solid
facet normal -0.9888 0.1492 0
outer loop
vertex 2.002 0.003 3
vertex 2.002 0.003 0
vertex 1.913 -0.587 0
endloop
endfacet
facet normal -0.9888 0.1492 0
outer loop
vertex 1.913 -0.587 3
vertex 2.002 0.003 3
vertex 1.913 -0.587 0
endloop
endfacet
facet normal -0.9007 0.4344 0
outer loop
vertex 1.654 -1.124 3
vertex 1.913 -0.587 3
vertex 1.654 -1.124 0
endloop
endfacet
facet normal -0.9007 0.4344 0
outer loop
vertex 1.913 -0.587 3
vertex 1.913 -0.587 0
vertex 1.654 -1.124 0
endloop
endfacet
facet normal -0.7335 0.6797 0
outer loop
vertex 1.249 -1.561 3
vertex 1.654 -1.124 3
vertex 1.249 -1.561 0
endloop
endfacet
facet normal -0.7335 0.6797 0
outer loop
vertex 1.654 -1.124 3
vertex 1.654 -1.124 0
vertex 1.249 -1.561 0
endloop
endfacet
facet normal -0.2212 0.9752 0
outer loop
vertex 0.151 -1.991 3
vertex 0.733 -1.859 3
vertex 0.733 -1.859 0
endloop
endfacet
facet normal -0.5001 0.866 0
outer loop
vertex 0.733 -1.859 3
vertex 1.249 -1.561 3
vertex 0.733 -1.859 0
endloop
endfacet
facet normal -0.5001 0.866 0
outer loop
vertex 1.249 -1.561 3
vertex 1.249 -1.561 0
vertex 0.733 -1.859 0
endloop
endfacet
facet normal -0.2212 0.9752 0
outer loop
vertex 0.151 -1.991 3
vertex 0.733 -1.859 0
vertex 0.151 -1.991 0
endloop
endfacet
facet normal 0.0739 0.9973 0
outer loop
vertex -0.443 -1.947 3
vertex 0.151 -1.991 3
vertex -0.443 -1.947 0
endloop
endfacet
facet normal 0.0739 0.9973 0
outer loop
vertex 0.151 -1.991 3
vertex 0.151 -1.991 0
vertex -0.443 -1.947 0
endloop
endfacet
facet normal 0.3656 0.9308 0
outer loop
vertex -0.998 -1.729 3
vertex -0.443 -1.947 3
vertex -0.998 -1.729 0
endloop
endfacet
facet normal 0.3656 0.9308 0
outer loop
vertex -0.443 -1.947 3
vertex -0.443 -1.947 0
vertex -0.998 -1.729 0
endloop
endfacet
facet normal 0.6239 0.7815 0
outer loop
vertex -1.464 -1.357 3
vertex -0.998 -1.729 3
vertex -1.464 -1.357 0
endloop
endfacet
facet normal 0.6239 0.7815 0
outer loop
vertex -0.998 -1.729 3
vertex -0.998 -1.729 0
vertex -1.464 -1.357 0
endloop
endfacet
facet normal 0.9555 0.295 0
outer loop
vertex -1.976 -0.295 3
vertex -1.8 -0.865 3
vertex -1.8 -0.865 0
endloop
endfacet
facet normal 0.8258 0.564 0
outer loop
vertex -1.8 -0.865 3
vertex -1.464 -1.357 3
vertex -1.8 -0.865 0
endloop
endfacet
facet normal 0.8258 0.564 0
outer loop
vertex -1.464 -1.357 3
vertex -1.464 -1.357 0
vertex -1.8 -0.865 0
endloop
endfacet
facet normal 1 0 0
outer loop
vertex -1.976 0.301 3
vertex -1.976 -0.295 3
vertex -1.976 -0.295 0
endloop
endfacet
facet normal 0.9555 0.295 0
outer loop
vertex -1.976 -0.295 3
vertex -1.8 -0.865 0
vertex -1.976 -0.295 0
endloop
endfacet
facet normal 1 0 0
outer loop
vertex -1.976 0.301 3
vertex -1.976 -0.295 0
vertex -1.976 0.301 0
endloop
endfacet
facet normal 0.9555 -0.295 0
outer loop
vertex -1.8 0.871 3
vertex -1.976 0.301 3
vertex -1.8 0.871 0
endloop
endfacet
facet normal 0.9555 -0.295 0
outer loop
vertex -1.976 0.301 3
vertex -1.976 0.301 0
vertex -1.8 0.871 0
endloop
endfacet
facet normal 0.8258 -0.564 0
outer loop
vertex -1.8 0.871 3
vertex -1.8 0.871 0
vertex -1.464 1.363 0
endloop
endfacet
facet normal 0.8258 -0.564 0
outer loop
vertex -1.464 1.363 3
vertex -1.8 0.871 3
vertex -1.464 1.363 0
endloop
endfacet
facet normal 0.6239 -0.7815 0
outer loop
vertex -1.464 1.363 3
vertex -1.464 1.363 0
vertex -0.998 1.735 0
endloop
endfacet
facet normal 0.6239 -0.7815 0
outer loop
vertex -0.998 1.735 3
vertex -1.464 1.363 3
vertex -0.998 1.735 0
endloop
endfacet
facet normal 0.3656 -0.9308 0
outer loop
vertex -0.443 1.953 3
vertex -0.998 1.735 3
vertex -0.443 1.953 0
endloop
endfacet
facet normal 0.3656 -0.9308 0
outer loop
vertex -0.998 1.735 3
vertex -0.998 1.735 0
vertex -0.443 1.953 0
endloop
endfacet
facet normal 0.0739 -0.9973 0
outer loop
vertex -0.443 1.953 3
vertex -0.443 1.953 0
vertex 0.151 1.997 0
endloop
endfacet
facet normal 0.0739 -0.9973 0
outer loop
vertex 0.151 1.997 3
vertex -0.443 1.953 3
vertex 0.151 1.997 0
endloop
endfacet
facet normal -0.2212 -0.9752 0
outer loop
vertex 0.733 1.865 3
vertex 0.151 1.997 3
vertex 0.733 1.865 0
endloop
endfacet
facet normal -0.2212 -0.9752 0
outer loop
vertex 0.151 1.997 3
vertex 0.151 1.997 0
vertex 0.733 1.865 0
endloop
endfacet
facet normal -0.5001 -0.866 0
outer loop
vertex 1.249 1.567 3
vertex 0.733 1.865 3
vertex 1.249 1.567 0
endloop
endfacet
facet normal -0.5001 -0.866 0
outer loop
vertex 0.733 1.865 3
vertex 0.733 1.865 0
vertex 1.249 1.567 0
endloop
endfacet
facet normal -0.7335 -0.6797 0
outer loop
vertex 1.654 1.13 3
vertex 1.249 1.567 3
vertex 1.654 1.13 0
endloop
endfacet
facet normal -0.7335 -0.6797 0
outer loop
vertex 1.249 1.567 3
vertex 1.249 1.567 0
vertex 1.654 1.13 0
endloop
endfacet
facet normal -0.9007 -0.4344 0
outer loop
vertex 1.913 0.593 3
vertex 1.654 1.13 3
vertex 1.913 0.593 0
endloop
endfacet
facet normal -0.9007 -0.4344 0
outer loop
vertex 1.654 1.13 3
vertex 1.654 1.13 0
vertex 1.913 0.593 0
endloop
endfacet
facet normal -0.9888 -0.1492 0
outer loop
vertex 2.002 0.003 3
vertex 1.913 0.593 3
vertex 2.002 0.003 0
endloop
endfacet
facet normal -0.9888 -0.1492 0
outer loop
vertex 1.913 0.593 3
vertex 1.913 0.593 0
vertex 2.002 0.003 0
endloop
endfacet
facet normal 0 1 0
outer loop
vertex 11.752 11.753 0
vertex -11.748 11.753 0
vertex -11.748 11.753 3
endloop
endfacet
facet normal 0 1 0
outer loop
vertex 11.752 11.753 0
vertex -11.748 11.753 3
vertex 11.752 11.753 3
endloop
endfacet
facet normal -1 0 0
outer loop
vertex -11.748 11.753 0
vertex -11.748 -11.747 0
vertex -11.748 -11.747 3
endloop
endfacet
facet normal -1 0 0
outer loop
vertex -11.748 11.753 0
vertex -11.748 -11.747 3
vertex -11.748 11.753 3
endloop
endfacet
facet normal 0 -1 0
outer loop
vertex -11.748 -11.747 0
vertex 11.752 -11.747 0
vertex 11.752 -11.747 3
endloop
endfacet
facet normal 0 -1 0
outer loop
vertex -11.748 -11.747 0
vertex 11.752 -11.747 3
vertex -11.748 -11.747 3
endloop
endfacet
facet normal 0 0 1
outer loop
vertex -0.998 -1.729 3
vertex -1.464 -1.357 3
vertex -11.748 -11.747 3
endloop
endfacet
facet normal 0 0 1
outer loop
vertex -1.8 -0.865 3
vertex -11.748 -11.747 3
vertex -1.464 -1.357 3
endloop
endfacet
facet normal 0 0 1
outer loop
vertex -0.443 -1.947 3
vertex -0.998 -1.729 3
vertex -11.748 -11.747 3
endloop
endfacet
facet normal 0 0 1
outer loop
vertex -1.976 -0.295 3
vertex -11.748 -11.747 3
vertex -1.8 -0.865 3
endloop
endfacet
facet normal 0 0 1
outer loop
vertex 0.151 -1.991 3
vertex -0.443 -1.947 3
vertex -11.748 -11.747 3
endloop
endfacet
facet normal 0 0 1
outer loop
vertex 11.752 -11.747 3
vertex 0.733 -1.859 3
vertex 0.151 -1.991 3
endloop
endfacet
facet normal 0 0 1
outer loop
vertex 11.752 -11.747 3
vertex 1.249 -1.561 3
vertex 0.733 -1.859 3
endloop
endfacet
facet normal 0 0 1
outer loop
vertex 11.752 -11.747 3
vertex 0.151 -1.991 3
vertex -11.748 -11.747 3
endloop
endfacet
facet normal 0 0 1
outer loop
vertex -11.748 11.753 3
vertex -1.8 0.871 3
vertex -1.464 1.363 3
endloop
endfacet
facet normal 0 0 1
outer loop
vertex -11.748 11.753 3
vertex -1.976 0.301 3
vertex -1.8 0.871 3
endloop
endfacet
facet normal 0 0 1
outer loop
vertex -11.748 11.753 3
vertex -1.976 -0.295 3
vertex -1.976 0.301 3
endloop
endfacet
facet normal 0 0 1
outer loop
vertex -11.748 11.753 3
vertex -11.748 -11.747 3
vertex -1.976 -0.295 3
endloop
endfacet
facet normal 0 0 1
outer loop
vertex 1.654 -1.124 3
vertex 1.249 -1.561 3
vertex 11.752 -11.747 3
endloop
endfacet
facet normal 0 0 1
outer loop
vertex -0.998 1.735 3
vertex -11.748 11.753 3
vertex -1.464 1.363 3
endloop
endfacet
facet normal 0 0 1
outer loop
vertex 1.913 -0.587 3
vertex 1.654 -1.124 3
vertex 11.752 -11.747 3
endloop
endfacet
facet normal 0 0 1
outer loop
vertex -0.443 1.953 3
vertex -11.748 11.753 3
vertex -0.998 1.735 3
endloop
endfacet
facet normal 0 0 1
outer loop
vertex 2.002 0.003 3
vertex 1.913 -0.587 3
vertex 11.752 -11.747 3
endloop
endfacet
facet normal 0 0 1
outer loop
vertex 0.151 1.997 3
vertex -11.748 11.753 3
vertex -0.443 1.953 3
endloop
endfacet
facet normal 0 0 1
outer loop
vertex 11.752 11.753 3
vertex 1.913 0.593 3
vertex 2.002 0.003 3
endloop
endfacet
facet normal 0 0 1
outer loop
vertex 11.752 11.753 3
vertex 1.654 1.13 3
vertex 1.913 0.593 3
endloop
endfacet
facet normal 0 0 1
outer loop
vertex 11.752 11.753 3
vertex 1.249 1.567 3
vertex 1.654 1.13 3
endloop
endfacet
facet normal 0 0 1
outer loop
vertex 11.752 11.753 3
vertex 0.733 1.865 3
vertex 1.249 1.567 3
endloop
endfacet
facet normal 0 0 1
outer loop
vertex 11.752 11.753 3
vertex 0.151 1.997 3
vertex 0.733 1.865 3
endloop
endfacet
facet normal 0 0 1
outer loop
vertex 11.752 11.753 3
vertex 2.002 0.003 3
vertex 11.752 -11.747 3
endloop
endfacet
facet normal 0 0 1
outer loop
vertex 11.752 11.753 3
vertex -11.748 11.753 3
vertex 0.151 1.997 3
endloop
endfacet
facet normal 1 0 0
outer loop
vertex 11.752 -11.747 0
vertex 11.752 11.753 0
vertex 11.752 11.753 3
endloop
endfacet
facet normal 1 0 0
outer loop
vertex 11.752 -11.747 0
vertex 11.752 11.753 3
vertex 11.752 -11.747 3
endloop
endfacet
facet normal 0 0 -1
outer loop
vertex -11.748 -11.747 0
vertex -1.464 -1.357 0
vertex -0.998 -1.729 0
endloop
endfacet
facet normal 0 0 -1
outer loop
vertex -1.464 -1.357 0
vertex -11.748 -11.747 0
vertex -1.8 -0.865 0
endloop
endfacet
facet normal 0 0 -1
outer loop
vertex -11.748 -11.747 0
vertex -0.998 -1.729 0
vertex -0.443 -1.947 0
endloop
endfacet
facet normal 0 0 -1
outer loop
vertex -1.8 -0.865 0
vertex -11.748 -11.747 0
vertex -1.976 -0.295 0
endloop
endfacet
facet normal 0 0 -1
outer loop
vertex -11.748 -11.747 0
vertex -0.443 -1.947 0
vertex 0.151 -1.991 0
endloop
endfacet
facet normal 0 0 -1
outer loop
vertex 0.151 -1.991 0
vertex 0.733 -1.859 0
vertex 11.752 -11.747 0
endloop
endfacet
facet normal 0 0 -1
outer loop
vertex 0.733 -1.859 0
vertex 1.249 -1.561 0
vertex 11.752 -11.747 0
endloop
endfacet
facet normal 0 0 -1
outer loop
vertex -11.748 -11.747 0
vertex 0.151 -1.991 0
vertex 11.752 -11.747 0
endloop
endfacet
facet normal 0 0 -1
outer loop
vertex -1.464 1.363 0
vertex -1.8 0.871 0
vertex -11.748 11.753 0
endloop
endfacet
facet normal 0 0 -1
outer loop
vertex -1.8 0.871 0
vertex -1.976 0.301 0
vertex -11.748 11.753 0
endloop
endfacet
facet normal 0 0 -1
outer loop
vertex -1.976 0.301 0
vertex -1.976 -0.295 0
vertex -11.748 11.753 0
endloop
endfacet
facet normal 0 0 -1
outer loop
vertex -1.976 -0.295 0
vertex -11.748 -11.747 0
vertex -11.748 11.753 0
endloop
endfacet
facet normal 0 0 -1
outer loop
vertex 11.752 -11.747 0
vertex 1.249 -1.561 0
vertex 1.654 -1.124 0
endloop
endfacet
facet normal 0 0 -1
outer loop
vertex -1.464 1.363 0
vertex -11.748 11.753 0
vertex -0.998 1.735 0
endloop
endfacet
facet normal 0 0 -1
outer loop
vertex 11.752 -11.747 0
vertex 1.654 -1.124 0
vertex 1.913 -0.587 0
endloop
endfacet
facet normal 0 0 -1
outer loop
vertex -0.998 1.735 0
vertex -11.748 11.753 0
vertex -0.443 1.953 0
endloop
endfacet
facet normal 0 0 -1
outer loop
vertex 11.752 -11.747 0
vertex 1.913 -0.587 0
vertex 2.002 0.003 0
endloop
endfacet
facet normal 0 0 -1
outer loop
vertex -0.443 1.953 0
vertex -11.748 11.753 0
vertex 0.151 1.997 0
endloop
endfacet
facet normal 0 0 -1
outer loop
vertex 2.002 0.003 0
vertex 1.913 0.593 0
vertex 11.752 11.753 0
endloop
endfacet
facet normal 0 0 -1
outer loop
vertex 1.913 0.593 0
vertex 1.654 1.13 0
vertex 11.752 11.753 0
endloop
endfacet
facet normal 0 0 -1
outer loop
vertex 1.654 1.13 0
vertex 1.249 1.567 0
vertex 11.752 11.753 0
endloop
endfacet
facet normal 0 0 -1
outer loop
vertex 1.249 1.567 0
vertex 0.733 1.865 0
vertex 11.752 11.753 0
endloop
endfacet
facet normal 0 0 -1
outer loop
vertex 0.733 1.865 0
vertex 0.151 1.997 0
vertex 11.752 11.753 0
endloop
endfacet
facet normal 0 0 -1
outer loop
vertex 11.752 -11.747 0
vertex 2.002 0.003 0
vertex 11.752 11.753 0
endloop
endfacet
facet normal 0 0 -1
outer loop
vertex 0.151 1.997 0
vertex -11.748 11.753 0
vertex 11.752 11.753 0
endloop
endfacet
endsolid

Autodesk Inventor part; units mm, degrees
ref_plane "YZ Plane" through (0, 0, 0) normal (1, 0, 0) x (0, 1, 0)
ref_plane "XZ Plane" through (0, 0, 0) normal (0, 1, 0) x (-1, 0, 0)
ref_plane "XY Plane" through (0, 0, 0) normal (0, 0, 1) x (1, 0, 0)
sketch "Sketch1" plane through (0, 0, 0) normal (0, 0, 1) x (1, 0, 0)
  circle A0 centre (0.002, 0.003) radius 2
  line L0 (-11.748, 11.753) -> (11.752, 11.753)
  line L1 (11.752, 11.753) -> (11.752, -11.747)
  line L2 (11.752, -11.747) -> (-11.748, -11.747)
  line L3 (-11.748, -11.747) -> (-11.748, 11.753)
  dimension "d5" = 4
  dimension "d8" = 23.5
  dimension "d9" = 23.5
extrude "Extrusion1" add sketch "Sketch1" along normal blind 3
properties part number "bold holder" material "Silver"
